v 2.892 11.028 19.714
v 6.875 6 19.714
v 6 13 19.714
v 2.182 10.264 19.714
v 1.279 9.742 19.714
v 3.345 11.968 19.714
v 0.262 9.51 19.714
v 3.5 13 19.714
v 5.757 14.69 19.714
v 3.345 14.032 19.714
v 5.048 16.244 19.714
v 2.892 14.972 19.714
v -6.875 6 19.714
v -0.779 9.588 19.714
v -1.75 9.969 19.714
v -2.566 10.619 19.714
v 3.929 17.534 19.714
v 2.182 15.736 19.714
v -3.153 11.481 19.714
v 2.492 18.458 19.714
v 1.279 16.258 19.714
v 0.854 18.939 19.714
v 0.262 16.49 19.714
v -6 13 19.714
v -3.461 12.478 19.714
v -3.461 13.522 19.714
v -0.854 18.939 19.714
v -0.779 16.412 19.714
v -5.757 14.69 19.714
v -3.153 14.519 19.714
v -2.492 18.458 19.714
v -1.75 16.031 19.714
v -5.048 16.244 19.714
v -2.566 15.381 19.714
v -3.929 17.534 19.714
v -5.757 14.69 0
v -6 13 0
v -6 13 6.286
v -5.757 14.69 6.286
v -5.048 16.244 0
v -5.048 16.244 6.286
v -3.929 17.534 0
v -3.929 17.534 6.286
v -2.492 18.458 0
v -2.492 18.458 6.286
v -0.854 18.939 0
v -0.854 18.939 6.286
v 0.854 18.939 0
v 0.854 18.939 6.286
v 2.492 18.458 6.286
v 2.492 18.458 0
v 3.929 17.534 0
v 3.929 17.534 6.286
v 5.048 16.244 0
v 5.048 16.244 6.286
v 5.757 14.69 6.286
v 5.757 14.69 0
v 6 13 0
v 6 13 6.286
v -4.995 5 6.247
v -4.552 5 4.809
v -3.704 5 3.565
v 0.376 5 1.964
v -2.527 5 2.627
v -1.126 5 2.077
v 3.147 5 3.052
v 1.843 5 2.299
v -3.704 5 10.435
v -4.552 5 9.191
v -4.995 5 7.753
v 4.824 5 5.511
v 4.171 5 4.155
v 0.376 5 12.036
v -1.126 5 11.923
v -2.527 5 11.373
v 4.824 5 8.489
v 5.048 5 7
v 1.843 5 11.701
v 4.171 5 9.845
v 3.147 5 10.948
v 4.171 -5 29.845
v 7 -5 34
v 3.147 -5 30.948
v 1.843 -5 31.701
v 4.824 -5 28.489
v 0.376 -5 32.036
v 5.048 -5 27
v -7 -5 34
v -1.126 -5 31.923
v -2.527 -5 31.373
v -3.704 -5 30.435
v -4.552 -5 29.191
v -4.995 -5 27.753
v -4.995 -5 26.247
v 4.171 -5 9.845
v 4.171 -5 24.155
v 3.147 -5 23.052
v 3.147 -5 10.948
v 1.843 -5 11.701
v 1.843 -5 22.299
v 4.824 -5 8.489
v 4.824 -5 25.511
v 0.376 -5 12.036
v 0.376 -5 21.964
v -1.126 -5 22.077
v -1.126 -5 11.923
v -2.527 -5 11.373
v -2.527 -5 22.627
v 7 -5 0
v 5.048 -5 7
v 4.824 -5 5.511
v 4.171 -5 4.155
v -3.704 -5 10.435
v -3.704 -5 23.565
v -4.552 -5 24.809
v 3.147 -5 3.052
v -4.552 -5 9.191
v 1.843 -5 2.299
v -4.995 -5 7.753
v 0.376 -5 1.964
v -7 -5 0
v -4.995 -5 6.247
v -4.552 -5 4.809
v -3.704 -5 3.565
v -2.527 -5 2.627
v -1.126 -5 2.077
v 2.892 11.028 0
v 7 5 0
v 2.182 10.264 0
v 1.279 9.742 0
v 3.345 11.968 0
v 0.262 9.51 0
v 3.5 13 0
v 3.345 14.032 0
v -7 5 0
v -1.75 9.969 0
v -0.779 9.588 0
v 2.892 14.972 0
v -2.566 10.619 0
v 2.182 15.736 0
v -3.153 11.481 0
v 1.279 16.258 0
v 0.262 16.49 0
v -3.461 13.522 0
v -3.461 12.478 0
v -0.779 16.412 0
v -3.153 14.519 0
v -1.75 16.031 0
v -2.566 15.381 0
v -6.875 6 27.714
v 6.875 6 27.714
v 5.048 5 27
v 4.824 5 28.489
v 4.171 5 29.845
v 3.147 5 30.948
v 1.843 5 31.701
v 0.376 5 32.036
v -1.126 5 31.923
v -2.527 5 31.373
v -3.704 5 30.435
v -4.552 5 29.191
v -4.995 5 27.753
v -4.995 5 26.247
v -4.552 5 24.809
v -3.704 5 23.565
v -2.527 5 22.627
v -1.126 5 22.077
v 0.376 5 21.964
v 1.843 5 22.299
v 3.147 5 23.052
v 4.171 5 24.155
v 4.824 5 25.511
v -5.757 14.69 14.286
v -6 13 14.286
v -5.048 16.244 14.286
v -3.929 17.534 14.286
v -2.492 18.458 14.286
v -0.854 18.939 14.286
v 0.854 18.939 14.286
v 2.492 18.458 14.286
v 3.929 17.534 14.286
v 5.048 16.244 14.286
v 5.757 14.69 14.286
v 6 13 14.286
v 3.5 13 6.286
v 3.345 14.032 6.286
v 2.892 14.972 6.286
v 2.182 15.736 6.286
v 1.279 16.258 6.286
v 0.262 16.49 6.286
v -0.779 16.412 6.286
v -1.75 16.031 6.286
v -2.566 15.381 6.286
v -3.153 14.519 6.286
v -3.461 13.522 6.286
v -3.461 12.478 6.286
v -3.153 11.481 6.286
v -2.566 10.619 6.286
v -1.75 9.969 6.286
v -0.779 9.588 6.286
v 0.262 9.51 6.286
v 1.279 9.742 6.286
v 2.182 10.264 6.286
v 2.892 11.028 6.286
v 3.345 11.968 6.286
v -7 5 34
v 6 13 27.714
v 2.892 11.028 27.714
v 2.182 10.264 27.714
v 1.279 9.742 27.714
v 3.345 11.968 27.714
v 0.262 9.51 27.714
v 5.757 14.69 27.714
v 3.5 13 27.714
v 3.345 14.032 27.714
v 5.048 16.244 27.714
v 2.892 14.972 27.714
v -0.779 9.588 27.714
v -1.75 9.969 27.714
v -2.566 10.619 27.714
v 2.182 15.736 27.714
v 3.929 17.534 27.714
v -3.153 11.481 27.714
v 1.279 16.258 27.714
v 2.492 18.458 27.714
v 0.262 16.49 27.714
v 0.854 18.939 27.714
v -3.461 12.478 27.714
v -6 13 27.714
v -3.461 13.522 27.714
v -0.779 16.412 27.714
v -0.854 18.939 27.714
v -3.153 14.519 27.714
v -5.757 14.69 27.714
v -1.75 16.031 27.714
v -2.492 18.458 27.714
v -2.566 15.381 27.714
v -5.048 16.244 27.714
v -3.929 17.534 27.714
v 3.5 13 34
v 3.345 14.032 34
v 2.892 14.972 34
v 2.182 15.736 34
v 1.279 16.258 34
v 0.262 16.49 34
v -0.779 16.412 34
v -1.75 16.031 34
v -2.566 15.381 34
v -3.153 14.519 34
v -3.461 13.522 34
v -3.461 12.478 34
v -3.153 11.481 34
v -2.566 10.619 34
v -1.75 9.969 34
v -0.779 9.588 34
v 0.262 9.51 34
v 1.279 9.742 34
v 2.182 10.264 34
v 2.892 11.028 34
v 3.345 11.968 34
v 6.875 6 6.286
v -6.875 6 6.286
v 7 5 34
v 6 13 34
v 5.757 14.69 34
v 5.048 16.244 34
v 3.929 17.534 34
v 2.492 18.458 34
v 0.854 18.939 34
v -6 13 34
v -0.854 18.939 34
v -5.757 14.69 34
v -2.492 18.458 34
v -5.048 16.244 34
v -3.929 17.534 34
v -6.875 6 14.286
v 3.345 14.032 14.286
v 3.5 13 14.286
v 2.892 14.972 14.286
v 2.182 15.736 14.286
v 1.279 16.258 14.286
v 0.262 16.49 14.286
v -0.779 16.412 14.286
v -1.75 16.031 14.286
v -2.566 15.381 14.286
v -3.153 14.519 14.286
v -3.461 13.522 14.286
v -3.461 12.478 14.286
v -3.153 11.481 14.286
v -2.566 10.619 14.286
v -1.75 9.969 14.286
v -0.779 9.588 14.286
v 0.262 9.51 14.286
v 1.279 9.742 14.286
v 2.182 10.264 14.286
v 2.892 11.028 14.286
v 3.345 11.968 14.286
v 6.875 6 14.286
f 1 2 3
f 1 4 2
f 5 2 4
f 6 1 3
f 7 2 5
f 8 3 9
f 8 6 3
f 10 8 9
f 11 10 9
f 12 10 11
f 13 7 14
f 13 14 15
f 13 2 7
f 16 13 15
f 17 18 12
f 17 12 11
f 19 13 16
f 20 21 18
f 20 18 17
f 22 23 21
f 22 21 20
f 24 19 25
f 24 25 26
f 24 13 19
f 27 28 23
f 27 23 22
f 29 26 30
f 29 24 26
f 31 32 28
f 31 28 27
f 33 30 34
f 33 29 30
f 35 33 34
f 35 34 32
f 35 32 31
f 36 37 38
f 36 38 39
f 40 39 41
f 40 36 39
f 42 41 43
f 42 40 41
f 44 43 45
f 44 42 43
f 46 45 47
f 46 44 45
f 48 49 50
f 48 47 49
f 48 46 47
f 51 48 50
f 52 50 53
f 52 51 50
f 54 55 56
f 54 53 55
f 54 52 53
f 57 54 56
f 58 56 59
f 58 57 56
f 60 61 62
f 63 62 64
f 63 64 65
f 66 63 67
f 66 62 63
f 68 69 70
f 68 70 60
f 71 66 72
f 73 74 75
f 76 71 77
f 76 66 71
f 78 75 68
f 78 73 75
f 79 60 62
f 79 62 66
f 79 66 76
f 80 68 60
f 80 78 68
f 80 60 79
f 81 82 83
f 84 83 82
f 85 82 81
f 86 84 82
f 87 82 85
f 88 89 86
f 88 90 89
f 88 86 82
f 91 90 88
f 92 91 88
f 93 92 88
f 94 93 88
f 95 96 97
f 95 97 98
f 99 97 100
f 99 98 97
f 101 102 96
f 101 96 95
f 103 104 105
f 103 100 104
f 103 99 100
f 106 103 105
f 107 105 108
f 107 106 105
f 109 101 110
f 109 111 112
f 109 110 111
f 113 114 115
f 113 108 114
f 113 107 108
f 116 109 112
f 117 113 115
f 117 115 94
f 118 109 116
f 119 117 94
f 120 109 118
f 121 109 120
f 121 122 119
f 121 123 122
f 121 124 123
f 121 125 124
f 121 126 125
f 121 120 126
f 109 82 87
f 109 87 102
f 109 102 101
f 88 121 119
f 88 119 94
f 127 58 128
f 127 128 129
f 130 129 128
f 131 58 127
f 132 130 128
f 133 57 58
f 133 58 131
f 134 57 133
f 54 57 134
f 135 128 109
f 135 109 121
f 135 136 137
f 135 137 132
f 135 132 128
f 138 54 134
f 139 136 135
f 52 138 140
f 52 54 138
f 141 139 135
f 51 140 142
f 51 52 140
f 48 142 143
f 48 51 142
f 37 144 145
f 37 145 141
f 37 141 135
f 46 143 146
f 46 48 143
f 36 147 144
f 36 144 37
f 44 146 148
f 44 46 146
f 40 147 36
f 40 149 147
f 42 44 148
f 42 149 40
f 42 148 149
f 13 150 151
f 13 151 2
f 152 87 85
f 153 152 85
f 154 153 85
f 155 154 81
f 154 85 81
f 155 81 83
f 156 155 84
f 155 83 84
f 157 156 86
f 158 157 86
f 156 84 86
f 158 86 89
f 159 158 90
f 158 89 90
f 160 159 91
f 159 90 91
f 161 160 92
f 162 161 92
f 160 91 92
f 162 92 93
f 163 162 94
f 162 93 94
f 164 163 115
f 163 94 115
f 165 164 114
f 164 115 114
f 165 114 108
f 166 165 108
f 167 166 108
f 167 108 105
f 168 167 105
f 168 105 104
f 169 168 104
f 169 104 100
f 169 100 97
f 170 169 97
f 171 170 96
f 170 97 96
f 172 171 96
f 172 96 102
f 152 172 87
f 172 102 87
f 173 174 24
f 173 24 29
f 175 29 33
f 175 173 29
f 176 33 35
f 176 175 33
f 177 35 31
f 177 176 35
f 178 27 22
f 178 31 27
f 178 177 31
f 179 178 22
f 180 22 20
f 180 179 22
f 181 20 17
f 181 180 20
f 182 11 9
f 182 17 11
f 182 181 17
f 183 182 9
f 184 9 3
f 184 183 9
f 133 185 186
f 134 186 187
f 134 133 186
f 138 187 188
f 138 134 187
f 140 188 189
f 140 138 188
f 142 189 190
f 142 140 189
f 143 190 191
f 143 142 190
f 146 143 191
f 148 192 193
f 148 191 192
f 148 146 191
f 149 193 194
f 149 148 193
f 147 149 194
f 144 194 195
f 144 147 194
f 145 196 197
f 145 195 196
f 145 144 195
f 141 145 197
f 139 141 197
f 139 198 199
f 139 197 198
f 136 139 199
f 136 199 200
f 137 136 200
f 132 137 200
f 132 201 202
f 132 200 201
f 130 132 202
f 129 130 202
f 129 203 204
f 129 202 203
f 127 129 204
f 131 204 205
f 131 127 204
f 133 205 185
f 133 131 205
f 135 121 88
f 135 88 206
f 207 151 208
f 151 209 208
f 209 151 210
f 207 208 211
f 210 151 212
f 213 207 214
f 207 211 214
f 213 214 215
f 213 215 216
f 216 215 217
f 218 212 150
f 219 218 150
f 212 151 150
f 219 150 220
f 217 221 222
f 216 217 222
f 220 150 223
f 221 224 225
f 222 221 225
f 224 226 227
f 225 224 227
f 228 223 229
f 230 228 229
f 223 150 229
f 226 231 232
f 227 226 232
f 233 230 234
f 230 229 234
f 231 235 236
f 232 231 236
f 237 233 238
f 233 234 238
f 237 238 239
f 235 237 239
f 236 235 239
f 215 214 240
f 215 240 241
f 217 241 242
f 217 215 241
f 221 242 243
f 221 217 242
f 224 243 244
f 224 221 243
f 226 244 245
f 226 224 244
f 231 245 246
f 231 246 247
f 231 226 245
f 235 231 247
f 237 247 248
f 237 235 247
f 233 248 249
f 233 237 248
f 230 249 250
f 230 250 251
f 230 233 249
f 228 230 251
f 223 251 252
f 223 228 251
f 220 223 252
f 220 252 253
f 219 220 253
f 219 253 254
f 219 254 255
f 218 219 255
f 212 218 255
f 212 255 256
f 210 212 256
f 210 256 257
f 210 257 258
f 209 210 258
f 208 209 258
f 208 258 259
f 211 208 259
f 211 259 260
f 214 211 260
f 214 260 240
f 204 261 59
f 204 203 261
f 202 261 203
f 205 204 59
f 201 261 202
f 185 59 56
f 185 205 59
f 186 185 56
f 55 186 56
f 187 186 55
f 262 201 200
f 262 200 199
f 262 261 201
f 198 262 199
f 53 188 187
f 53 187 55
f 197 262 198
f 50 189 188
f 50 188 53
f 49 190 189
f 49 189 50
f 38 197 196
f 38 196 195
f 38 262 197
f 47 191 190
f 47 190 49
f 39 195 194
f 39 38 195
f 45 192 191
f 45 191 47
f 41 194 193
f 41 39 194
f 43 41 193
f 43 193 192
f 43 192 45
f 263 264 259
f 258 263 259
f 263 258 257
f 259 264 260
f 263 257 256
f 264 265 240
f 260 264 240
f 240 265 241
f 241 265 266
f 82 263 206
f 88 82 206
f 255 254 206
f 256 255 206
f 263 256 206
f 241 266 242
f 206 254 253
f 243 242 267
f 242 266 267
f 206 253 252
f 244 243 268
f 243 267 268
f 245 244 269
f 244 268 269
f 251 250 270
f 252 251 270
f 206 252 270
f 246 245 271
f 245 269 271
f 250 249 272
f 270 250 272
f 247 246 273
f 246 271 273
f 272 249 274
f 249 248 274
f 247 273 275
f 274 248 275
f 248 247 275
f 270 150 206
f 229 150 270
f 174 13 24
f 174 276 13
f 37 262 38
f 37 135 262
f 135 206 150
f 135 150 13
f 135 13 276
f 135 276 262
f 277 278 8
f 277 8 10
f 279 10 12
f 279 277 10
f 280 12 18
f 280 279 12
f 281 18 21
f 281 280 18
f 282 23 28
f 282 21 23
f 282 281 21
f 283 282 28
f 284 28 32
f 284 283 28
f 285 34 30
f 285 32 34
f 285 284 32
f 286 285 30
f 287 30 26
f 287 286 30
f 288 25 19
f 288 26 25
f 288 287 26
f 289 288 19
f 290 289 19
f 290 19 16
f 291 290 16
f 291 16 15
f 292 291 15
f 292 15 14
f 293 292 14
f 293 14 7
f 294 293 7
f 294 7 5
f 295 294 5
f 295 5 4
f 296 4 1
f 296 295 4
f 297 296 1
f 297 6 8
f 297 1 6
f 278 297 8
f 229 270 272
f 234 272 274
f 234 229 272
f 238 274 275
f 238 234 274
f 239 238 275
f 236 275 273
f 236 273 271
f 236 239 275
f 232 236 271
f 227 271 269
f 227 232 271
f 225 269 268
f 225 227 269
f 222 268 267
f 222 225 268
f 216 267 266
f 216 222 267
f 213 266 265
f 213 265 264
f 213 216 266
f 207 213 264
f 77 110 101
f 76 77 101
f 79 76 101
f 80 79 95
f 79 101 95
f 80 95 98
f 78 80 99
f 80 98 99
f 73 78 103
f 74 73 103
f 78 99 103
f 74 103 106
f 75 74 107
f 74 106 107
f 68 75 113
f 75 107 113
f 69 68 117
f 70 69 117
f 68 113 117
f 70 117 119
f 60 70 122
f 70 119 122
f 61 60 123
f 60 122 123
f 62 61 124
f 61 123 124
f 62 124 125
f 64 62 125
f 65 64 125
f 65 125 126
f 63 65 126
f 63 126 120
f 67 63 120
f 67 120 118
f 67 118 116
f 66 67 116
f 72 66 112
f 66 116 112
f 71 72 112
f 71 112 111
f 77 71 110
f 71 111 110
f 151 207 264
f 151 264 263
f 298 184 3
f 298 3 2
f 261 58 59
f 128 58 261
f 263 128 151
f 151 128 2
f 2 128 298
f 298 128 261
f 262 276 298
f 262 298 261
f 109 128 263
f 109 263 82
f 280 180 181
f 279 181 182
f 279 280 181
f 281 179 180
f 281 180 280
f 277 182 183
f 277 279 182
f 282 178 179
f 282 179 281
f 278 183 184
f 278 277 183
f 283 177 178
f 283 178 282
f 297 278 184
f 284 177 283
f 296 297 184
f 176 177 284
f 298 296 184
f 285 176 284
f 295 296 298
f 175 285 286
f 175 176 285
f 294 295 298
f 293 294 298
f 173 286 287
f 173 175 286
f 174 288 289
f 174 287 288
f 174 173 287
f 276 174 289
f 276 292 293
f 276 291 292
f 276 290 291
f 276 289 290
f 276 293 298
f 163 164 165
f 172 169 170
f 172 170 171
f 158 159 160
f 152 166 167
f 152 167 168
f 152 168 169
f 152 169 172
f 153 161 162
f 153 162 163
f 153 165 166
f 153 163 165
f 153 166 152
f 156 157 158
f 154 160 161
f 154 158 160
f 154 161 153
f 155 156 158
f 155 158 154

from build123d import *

# Parameters (mm, degrees)
SKETCH_1_R               = 3.5
EXTRUDE_2_DEPTH          = 34
CUT_EXTRUDE_1_DEPTH      = 42.388404173
CUT_EXTRUDE_1_DEPTH_BACK = 42.388404173
SKETCH_3_W               = 8
SKETCH_3_H               = 13
SKETCH_4_R               = 5.05
CUT_EXTRUDE_3_DEPTH      = 10


with BuildPart() as part:
    # 草图1 → 凸台-拉伸2 (new body)
    with BuildSketch(Plane.XY):
        with BuildLine():
            Line((7, 5), (7, -5))
            Line((7, -5), (-7, -5))
            Line((-7, -5), (-7, 5))
            Line((-7, 5), (-6, 13))
            ThreePointArc((-6, 13), (0, 19), (6, 13))
            Line((6, 13), (7, 5))
        make_face()
        with Locations((0, 13)):
            Circle(SKETCH_1_R, mode=Mode.SUBTRACT)
    extrude(amount=EXTRUDE_2_DEPTH)

    # 草图3 → 切除-拉伸1 (cut, two sides: drawn at the far end of the back side and taken through both)
    with BuildSketch(Plane(origin=(7, 0, 0), x_dir=(0, 0, -1), z_dir=(1, 0, 0)).offset(-CUT_EXTRUDE_1_DEPTH_BACK)):
        with Locations((-23.713626646, 12.5)):
            Rectangle(SKETCH_3_W, SKETCH_3_H)
        Polygon((-6.286373354, 19), (-13.713626646, 19), (-14.286373354, 19), (-14.286373354, 6), (-6.286373354, 6), align=None)
    extrude(amount=CUT_EXTRUDE_1_DEPTH + CUT_EXTRUDE_1_DEPTH_BACK, mode=Mode.SUBTRACT)

    # 草图4 → 切除-拉伸3 (cut)
    with BuildSketch(Plane.XZ.offset(5)):
        with Locations((-0.001873454, 27)):
            Circle(SKETCH_4_R)
        with Locations((-0.001873454, 7)):
            Circle(SKETCH_4_R)
    extrude(amount=-CUT_EXTRUDE_3_DEPTH, mode=Mode.SUBTRACT)


solid = part.part
